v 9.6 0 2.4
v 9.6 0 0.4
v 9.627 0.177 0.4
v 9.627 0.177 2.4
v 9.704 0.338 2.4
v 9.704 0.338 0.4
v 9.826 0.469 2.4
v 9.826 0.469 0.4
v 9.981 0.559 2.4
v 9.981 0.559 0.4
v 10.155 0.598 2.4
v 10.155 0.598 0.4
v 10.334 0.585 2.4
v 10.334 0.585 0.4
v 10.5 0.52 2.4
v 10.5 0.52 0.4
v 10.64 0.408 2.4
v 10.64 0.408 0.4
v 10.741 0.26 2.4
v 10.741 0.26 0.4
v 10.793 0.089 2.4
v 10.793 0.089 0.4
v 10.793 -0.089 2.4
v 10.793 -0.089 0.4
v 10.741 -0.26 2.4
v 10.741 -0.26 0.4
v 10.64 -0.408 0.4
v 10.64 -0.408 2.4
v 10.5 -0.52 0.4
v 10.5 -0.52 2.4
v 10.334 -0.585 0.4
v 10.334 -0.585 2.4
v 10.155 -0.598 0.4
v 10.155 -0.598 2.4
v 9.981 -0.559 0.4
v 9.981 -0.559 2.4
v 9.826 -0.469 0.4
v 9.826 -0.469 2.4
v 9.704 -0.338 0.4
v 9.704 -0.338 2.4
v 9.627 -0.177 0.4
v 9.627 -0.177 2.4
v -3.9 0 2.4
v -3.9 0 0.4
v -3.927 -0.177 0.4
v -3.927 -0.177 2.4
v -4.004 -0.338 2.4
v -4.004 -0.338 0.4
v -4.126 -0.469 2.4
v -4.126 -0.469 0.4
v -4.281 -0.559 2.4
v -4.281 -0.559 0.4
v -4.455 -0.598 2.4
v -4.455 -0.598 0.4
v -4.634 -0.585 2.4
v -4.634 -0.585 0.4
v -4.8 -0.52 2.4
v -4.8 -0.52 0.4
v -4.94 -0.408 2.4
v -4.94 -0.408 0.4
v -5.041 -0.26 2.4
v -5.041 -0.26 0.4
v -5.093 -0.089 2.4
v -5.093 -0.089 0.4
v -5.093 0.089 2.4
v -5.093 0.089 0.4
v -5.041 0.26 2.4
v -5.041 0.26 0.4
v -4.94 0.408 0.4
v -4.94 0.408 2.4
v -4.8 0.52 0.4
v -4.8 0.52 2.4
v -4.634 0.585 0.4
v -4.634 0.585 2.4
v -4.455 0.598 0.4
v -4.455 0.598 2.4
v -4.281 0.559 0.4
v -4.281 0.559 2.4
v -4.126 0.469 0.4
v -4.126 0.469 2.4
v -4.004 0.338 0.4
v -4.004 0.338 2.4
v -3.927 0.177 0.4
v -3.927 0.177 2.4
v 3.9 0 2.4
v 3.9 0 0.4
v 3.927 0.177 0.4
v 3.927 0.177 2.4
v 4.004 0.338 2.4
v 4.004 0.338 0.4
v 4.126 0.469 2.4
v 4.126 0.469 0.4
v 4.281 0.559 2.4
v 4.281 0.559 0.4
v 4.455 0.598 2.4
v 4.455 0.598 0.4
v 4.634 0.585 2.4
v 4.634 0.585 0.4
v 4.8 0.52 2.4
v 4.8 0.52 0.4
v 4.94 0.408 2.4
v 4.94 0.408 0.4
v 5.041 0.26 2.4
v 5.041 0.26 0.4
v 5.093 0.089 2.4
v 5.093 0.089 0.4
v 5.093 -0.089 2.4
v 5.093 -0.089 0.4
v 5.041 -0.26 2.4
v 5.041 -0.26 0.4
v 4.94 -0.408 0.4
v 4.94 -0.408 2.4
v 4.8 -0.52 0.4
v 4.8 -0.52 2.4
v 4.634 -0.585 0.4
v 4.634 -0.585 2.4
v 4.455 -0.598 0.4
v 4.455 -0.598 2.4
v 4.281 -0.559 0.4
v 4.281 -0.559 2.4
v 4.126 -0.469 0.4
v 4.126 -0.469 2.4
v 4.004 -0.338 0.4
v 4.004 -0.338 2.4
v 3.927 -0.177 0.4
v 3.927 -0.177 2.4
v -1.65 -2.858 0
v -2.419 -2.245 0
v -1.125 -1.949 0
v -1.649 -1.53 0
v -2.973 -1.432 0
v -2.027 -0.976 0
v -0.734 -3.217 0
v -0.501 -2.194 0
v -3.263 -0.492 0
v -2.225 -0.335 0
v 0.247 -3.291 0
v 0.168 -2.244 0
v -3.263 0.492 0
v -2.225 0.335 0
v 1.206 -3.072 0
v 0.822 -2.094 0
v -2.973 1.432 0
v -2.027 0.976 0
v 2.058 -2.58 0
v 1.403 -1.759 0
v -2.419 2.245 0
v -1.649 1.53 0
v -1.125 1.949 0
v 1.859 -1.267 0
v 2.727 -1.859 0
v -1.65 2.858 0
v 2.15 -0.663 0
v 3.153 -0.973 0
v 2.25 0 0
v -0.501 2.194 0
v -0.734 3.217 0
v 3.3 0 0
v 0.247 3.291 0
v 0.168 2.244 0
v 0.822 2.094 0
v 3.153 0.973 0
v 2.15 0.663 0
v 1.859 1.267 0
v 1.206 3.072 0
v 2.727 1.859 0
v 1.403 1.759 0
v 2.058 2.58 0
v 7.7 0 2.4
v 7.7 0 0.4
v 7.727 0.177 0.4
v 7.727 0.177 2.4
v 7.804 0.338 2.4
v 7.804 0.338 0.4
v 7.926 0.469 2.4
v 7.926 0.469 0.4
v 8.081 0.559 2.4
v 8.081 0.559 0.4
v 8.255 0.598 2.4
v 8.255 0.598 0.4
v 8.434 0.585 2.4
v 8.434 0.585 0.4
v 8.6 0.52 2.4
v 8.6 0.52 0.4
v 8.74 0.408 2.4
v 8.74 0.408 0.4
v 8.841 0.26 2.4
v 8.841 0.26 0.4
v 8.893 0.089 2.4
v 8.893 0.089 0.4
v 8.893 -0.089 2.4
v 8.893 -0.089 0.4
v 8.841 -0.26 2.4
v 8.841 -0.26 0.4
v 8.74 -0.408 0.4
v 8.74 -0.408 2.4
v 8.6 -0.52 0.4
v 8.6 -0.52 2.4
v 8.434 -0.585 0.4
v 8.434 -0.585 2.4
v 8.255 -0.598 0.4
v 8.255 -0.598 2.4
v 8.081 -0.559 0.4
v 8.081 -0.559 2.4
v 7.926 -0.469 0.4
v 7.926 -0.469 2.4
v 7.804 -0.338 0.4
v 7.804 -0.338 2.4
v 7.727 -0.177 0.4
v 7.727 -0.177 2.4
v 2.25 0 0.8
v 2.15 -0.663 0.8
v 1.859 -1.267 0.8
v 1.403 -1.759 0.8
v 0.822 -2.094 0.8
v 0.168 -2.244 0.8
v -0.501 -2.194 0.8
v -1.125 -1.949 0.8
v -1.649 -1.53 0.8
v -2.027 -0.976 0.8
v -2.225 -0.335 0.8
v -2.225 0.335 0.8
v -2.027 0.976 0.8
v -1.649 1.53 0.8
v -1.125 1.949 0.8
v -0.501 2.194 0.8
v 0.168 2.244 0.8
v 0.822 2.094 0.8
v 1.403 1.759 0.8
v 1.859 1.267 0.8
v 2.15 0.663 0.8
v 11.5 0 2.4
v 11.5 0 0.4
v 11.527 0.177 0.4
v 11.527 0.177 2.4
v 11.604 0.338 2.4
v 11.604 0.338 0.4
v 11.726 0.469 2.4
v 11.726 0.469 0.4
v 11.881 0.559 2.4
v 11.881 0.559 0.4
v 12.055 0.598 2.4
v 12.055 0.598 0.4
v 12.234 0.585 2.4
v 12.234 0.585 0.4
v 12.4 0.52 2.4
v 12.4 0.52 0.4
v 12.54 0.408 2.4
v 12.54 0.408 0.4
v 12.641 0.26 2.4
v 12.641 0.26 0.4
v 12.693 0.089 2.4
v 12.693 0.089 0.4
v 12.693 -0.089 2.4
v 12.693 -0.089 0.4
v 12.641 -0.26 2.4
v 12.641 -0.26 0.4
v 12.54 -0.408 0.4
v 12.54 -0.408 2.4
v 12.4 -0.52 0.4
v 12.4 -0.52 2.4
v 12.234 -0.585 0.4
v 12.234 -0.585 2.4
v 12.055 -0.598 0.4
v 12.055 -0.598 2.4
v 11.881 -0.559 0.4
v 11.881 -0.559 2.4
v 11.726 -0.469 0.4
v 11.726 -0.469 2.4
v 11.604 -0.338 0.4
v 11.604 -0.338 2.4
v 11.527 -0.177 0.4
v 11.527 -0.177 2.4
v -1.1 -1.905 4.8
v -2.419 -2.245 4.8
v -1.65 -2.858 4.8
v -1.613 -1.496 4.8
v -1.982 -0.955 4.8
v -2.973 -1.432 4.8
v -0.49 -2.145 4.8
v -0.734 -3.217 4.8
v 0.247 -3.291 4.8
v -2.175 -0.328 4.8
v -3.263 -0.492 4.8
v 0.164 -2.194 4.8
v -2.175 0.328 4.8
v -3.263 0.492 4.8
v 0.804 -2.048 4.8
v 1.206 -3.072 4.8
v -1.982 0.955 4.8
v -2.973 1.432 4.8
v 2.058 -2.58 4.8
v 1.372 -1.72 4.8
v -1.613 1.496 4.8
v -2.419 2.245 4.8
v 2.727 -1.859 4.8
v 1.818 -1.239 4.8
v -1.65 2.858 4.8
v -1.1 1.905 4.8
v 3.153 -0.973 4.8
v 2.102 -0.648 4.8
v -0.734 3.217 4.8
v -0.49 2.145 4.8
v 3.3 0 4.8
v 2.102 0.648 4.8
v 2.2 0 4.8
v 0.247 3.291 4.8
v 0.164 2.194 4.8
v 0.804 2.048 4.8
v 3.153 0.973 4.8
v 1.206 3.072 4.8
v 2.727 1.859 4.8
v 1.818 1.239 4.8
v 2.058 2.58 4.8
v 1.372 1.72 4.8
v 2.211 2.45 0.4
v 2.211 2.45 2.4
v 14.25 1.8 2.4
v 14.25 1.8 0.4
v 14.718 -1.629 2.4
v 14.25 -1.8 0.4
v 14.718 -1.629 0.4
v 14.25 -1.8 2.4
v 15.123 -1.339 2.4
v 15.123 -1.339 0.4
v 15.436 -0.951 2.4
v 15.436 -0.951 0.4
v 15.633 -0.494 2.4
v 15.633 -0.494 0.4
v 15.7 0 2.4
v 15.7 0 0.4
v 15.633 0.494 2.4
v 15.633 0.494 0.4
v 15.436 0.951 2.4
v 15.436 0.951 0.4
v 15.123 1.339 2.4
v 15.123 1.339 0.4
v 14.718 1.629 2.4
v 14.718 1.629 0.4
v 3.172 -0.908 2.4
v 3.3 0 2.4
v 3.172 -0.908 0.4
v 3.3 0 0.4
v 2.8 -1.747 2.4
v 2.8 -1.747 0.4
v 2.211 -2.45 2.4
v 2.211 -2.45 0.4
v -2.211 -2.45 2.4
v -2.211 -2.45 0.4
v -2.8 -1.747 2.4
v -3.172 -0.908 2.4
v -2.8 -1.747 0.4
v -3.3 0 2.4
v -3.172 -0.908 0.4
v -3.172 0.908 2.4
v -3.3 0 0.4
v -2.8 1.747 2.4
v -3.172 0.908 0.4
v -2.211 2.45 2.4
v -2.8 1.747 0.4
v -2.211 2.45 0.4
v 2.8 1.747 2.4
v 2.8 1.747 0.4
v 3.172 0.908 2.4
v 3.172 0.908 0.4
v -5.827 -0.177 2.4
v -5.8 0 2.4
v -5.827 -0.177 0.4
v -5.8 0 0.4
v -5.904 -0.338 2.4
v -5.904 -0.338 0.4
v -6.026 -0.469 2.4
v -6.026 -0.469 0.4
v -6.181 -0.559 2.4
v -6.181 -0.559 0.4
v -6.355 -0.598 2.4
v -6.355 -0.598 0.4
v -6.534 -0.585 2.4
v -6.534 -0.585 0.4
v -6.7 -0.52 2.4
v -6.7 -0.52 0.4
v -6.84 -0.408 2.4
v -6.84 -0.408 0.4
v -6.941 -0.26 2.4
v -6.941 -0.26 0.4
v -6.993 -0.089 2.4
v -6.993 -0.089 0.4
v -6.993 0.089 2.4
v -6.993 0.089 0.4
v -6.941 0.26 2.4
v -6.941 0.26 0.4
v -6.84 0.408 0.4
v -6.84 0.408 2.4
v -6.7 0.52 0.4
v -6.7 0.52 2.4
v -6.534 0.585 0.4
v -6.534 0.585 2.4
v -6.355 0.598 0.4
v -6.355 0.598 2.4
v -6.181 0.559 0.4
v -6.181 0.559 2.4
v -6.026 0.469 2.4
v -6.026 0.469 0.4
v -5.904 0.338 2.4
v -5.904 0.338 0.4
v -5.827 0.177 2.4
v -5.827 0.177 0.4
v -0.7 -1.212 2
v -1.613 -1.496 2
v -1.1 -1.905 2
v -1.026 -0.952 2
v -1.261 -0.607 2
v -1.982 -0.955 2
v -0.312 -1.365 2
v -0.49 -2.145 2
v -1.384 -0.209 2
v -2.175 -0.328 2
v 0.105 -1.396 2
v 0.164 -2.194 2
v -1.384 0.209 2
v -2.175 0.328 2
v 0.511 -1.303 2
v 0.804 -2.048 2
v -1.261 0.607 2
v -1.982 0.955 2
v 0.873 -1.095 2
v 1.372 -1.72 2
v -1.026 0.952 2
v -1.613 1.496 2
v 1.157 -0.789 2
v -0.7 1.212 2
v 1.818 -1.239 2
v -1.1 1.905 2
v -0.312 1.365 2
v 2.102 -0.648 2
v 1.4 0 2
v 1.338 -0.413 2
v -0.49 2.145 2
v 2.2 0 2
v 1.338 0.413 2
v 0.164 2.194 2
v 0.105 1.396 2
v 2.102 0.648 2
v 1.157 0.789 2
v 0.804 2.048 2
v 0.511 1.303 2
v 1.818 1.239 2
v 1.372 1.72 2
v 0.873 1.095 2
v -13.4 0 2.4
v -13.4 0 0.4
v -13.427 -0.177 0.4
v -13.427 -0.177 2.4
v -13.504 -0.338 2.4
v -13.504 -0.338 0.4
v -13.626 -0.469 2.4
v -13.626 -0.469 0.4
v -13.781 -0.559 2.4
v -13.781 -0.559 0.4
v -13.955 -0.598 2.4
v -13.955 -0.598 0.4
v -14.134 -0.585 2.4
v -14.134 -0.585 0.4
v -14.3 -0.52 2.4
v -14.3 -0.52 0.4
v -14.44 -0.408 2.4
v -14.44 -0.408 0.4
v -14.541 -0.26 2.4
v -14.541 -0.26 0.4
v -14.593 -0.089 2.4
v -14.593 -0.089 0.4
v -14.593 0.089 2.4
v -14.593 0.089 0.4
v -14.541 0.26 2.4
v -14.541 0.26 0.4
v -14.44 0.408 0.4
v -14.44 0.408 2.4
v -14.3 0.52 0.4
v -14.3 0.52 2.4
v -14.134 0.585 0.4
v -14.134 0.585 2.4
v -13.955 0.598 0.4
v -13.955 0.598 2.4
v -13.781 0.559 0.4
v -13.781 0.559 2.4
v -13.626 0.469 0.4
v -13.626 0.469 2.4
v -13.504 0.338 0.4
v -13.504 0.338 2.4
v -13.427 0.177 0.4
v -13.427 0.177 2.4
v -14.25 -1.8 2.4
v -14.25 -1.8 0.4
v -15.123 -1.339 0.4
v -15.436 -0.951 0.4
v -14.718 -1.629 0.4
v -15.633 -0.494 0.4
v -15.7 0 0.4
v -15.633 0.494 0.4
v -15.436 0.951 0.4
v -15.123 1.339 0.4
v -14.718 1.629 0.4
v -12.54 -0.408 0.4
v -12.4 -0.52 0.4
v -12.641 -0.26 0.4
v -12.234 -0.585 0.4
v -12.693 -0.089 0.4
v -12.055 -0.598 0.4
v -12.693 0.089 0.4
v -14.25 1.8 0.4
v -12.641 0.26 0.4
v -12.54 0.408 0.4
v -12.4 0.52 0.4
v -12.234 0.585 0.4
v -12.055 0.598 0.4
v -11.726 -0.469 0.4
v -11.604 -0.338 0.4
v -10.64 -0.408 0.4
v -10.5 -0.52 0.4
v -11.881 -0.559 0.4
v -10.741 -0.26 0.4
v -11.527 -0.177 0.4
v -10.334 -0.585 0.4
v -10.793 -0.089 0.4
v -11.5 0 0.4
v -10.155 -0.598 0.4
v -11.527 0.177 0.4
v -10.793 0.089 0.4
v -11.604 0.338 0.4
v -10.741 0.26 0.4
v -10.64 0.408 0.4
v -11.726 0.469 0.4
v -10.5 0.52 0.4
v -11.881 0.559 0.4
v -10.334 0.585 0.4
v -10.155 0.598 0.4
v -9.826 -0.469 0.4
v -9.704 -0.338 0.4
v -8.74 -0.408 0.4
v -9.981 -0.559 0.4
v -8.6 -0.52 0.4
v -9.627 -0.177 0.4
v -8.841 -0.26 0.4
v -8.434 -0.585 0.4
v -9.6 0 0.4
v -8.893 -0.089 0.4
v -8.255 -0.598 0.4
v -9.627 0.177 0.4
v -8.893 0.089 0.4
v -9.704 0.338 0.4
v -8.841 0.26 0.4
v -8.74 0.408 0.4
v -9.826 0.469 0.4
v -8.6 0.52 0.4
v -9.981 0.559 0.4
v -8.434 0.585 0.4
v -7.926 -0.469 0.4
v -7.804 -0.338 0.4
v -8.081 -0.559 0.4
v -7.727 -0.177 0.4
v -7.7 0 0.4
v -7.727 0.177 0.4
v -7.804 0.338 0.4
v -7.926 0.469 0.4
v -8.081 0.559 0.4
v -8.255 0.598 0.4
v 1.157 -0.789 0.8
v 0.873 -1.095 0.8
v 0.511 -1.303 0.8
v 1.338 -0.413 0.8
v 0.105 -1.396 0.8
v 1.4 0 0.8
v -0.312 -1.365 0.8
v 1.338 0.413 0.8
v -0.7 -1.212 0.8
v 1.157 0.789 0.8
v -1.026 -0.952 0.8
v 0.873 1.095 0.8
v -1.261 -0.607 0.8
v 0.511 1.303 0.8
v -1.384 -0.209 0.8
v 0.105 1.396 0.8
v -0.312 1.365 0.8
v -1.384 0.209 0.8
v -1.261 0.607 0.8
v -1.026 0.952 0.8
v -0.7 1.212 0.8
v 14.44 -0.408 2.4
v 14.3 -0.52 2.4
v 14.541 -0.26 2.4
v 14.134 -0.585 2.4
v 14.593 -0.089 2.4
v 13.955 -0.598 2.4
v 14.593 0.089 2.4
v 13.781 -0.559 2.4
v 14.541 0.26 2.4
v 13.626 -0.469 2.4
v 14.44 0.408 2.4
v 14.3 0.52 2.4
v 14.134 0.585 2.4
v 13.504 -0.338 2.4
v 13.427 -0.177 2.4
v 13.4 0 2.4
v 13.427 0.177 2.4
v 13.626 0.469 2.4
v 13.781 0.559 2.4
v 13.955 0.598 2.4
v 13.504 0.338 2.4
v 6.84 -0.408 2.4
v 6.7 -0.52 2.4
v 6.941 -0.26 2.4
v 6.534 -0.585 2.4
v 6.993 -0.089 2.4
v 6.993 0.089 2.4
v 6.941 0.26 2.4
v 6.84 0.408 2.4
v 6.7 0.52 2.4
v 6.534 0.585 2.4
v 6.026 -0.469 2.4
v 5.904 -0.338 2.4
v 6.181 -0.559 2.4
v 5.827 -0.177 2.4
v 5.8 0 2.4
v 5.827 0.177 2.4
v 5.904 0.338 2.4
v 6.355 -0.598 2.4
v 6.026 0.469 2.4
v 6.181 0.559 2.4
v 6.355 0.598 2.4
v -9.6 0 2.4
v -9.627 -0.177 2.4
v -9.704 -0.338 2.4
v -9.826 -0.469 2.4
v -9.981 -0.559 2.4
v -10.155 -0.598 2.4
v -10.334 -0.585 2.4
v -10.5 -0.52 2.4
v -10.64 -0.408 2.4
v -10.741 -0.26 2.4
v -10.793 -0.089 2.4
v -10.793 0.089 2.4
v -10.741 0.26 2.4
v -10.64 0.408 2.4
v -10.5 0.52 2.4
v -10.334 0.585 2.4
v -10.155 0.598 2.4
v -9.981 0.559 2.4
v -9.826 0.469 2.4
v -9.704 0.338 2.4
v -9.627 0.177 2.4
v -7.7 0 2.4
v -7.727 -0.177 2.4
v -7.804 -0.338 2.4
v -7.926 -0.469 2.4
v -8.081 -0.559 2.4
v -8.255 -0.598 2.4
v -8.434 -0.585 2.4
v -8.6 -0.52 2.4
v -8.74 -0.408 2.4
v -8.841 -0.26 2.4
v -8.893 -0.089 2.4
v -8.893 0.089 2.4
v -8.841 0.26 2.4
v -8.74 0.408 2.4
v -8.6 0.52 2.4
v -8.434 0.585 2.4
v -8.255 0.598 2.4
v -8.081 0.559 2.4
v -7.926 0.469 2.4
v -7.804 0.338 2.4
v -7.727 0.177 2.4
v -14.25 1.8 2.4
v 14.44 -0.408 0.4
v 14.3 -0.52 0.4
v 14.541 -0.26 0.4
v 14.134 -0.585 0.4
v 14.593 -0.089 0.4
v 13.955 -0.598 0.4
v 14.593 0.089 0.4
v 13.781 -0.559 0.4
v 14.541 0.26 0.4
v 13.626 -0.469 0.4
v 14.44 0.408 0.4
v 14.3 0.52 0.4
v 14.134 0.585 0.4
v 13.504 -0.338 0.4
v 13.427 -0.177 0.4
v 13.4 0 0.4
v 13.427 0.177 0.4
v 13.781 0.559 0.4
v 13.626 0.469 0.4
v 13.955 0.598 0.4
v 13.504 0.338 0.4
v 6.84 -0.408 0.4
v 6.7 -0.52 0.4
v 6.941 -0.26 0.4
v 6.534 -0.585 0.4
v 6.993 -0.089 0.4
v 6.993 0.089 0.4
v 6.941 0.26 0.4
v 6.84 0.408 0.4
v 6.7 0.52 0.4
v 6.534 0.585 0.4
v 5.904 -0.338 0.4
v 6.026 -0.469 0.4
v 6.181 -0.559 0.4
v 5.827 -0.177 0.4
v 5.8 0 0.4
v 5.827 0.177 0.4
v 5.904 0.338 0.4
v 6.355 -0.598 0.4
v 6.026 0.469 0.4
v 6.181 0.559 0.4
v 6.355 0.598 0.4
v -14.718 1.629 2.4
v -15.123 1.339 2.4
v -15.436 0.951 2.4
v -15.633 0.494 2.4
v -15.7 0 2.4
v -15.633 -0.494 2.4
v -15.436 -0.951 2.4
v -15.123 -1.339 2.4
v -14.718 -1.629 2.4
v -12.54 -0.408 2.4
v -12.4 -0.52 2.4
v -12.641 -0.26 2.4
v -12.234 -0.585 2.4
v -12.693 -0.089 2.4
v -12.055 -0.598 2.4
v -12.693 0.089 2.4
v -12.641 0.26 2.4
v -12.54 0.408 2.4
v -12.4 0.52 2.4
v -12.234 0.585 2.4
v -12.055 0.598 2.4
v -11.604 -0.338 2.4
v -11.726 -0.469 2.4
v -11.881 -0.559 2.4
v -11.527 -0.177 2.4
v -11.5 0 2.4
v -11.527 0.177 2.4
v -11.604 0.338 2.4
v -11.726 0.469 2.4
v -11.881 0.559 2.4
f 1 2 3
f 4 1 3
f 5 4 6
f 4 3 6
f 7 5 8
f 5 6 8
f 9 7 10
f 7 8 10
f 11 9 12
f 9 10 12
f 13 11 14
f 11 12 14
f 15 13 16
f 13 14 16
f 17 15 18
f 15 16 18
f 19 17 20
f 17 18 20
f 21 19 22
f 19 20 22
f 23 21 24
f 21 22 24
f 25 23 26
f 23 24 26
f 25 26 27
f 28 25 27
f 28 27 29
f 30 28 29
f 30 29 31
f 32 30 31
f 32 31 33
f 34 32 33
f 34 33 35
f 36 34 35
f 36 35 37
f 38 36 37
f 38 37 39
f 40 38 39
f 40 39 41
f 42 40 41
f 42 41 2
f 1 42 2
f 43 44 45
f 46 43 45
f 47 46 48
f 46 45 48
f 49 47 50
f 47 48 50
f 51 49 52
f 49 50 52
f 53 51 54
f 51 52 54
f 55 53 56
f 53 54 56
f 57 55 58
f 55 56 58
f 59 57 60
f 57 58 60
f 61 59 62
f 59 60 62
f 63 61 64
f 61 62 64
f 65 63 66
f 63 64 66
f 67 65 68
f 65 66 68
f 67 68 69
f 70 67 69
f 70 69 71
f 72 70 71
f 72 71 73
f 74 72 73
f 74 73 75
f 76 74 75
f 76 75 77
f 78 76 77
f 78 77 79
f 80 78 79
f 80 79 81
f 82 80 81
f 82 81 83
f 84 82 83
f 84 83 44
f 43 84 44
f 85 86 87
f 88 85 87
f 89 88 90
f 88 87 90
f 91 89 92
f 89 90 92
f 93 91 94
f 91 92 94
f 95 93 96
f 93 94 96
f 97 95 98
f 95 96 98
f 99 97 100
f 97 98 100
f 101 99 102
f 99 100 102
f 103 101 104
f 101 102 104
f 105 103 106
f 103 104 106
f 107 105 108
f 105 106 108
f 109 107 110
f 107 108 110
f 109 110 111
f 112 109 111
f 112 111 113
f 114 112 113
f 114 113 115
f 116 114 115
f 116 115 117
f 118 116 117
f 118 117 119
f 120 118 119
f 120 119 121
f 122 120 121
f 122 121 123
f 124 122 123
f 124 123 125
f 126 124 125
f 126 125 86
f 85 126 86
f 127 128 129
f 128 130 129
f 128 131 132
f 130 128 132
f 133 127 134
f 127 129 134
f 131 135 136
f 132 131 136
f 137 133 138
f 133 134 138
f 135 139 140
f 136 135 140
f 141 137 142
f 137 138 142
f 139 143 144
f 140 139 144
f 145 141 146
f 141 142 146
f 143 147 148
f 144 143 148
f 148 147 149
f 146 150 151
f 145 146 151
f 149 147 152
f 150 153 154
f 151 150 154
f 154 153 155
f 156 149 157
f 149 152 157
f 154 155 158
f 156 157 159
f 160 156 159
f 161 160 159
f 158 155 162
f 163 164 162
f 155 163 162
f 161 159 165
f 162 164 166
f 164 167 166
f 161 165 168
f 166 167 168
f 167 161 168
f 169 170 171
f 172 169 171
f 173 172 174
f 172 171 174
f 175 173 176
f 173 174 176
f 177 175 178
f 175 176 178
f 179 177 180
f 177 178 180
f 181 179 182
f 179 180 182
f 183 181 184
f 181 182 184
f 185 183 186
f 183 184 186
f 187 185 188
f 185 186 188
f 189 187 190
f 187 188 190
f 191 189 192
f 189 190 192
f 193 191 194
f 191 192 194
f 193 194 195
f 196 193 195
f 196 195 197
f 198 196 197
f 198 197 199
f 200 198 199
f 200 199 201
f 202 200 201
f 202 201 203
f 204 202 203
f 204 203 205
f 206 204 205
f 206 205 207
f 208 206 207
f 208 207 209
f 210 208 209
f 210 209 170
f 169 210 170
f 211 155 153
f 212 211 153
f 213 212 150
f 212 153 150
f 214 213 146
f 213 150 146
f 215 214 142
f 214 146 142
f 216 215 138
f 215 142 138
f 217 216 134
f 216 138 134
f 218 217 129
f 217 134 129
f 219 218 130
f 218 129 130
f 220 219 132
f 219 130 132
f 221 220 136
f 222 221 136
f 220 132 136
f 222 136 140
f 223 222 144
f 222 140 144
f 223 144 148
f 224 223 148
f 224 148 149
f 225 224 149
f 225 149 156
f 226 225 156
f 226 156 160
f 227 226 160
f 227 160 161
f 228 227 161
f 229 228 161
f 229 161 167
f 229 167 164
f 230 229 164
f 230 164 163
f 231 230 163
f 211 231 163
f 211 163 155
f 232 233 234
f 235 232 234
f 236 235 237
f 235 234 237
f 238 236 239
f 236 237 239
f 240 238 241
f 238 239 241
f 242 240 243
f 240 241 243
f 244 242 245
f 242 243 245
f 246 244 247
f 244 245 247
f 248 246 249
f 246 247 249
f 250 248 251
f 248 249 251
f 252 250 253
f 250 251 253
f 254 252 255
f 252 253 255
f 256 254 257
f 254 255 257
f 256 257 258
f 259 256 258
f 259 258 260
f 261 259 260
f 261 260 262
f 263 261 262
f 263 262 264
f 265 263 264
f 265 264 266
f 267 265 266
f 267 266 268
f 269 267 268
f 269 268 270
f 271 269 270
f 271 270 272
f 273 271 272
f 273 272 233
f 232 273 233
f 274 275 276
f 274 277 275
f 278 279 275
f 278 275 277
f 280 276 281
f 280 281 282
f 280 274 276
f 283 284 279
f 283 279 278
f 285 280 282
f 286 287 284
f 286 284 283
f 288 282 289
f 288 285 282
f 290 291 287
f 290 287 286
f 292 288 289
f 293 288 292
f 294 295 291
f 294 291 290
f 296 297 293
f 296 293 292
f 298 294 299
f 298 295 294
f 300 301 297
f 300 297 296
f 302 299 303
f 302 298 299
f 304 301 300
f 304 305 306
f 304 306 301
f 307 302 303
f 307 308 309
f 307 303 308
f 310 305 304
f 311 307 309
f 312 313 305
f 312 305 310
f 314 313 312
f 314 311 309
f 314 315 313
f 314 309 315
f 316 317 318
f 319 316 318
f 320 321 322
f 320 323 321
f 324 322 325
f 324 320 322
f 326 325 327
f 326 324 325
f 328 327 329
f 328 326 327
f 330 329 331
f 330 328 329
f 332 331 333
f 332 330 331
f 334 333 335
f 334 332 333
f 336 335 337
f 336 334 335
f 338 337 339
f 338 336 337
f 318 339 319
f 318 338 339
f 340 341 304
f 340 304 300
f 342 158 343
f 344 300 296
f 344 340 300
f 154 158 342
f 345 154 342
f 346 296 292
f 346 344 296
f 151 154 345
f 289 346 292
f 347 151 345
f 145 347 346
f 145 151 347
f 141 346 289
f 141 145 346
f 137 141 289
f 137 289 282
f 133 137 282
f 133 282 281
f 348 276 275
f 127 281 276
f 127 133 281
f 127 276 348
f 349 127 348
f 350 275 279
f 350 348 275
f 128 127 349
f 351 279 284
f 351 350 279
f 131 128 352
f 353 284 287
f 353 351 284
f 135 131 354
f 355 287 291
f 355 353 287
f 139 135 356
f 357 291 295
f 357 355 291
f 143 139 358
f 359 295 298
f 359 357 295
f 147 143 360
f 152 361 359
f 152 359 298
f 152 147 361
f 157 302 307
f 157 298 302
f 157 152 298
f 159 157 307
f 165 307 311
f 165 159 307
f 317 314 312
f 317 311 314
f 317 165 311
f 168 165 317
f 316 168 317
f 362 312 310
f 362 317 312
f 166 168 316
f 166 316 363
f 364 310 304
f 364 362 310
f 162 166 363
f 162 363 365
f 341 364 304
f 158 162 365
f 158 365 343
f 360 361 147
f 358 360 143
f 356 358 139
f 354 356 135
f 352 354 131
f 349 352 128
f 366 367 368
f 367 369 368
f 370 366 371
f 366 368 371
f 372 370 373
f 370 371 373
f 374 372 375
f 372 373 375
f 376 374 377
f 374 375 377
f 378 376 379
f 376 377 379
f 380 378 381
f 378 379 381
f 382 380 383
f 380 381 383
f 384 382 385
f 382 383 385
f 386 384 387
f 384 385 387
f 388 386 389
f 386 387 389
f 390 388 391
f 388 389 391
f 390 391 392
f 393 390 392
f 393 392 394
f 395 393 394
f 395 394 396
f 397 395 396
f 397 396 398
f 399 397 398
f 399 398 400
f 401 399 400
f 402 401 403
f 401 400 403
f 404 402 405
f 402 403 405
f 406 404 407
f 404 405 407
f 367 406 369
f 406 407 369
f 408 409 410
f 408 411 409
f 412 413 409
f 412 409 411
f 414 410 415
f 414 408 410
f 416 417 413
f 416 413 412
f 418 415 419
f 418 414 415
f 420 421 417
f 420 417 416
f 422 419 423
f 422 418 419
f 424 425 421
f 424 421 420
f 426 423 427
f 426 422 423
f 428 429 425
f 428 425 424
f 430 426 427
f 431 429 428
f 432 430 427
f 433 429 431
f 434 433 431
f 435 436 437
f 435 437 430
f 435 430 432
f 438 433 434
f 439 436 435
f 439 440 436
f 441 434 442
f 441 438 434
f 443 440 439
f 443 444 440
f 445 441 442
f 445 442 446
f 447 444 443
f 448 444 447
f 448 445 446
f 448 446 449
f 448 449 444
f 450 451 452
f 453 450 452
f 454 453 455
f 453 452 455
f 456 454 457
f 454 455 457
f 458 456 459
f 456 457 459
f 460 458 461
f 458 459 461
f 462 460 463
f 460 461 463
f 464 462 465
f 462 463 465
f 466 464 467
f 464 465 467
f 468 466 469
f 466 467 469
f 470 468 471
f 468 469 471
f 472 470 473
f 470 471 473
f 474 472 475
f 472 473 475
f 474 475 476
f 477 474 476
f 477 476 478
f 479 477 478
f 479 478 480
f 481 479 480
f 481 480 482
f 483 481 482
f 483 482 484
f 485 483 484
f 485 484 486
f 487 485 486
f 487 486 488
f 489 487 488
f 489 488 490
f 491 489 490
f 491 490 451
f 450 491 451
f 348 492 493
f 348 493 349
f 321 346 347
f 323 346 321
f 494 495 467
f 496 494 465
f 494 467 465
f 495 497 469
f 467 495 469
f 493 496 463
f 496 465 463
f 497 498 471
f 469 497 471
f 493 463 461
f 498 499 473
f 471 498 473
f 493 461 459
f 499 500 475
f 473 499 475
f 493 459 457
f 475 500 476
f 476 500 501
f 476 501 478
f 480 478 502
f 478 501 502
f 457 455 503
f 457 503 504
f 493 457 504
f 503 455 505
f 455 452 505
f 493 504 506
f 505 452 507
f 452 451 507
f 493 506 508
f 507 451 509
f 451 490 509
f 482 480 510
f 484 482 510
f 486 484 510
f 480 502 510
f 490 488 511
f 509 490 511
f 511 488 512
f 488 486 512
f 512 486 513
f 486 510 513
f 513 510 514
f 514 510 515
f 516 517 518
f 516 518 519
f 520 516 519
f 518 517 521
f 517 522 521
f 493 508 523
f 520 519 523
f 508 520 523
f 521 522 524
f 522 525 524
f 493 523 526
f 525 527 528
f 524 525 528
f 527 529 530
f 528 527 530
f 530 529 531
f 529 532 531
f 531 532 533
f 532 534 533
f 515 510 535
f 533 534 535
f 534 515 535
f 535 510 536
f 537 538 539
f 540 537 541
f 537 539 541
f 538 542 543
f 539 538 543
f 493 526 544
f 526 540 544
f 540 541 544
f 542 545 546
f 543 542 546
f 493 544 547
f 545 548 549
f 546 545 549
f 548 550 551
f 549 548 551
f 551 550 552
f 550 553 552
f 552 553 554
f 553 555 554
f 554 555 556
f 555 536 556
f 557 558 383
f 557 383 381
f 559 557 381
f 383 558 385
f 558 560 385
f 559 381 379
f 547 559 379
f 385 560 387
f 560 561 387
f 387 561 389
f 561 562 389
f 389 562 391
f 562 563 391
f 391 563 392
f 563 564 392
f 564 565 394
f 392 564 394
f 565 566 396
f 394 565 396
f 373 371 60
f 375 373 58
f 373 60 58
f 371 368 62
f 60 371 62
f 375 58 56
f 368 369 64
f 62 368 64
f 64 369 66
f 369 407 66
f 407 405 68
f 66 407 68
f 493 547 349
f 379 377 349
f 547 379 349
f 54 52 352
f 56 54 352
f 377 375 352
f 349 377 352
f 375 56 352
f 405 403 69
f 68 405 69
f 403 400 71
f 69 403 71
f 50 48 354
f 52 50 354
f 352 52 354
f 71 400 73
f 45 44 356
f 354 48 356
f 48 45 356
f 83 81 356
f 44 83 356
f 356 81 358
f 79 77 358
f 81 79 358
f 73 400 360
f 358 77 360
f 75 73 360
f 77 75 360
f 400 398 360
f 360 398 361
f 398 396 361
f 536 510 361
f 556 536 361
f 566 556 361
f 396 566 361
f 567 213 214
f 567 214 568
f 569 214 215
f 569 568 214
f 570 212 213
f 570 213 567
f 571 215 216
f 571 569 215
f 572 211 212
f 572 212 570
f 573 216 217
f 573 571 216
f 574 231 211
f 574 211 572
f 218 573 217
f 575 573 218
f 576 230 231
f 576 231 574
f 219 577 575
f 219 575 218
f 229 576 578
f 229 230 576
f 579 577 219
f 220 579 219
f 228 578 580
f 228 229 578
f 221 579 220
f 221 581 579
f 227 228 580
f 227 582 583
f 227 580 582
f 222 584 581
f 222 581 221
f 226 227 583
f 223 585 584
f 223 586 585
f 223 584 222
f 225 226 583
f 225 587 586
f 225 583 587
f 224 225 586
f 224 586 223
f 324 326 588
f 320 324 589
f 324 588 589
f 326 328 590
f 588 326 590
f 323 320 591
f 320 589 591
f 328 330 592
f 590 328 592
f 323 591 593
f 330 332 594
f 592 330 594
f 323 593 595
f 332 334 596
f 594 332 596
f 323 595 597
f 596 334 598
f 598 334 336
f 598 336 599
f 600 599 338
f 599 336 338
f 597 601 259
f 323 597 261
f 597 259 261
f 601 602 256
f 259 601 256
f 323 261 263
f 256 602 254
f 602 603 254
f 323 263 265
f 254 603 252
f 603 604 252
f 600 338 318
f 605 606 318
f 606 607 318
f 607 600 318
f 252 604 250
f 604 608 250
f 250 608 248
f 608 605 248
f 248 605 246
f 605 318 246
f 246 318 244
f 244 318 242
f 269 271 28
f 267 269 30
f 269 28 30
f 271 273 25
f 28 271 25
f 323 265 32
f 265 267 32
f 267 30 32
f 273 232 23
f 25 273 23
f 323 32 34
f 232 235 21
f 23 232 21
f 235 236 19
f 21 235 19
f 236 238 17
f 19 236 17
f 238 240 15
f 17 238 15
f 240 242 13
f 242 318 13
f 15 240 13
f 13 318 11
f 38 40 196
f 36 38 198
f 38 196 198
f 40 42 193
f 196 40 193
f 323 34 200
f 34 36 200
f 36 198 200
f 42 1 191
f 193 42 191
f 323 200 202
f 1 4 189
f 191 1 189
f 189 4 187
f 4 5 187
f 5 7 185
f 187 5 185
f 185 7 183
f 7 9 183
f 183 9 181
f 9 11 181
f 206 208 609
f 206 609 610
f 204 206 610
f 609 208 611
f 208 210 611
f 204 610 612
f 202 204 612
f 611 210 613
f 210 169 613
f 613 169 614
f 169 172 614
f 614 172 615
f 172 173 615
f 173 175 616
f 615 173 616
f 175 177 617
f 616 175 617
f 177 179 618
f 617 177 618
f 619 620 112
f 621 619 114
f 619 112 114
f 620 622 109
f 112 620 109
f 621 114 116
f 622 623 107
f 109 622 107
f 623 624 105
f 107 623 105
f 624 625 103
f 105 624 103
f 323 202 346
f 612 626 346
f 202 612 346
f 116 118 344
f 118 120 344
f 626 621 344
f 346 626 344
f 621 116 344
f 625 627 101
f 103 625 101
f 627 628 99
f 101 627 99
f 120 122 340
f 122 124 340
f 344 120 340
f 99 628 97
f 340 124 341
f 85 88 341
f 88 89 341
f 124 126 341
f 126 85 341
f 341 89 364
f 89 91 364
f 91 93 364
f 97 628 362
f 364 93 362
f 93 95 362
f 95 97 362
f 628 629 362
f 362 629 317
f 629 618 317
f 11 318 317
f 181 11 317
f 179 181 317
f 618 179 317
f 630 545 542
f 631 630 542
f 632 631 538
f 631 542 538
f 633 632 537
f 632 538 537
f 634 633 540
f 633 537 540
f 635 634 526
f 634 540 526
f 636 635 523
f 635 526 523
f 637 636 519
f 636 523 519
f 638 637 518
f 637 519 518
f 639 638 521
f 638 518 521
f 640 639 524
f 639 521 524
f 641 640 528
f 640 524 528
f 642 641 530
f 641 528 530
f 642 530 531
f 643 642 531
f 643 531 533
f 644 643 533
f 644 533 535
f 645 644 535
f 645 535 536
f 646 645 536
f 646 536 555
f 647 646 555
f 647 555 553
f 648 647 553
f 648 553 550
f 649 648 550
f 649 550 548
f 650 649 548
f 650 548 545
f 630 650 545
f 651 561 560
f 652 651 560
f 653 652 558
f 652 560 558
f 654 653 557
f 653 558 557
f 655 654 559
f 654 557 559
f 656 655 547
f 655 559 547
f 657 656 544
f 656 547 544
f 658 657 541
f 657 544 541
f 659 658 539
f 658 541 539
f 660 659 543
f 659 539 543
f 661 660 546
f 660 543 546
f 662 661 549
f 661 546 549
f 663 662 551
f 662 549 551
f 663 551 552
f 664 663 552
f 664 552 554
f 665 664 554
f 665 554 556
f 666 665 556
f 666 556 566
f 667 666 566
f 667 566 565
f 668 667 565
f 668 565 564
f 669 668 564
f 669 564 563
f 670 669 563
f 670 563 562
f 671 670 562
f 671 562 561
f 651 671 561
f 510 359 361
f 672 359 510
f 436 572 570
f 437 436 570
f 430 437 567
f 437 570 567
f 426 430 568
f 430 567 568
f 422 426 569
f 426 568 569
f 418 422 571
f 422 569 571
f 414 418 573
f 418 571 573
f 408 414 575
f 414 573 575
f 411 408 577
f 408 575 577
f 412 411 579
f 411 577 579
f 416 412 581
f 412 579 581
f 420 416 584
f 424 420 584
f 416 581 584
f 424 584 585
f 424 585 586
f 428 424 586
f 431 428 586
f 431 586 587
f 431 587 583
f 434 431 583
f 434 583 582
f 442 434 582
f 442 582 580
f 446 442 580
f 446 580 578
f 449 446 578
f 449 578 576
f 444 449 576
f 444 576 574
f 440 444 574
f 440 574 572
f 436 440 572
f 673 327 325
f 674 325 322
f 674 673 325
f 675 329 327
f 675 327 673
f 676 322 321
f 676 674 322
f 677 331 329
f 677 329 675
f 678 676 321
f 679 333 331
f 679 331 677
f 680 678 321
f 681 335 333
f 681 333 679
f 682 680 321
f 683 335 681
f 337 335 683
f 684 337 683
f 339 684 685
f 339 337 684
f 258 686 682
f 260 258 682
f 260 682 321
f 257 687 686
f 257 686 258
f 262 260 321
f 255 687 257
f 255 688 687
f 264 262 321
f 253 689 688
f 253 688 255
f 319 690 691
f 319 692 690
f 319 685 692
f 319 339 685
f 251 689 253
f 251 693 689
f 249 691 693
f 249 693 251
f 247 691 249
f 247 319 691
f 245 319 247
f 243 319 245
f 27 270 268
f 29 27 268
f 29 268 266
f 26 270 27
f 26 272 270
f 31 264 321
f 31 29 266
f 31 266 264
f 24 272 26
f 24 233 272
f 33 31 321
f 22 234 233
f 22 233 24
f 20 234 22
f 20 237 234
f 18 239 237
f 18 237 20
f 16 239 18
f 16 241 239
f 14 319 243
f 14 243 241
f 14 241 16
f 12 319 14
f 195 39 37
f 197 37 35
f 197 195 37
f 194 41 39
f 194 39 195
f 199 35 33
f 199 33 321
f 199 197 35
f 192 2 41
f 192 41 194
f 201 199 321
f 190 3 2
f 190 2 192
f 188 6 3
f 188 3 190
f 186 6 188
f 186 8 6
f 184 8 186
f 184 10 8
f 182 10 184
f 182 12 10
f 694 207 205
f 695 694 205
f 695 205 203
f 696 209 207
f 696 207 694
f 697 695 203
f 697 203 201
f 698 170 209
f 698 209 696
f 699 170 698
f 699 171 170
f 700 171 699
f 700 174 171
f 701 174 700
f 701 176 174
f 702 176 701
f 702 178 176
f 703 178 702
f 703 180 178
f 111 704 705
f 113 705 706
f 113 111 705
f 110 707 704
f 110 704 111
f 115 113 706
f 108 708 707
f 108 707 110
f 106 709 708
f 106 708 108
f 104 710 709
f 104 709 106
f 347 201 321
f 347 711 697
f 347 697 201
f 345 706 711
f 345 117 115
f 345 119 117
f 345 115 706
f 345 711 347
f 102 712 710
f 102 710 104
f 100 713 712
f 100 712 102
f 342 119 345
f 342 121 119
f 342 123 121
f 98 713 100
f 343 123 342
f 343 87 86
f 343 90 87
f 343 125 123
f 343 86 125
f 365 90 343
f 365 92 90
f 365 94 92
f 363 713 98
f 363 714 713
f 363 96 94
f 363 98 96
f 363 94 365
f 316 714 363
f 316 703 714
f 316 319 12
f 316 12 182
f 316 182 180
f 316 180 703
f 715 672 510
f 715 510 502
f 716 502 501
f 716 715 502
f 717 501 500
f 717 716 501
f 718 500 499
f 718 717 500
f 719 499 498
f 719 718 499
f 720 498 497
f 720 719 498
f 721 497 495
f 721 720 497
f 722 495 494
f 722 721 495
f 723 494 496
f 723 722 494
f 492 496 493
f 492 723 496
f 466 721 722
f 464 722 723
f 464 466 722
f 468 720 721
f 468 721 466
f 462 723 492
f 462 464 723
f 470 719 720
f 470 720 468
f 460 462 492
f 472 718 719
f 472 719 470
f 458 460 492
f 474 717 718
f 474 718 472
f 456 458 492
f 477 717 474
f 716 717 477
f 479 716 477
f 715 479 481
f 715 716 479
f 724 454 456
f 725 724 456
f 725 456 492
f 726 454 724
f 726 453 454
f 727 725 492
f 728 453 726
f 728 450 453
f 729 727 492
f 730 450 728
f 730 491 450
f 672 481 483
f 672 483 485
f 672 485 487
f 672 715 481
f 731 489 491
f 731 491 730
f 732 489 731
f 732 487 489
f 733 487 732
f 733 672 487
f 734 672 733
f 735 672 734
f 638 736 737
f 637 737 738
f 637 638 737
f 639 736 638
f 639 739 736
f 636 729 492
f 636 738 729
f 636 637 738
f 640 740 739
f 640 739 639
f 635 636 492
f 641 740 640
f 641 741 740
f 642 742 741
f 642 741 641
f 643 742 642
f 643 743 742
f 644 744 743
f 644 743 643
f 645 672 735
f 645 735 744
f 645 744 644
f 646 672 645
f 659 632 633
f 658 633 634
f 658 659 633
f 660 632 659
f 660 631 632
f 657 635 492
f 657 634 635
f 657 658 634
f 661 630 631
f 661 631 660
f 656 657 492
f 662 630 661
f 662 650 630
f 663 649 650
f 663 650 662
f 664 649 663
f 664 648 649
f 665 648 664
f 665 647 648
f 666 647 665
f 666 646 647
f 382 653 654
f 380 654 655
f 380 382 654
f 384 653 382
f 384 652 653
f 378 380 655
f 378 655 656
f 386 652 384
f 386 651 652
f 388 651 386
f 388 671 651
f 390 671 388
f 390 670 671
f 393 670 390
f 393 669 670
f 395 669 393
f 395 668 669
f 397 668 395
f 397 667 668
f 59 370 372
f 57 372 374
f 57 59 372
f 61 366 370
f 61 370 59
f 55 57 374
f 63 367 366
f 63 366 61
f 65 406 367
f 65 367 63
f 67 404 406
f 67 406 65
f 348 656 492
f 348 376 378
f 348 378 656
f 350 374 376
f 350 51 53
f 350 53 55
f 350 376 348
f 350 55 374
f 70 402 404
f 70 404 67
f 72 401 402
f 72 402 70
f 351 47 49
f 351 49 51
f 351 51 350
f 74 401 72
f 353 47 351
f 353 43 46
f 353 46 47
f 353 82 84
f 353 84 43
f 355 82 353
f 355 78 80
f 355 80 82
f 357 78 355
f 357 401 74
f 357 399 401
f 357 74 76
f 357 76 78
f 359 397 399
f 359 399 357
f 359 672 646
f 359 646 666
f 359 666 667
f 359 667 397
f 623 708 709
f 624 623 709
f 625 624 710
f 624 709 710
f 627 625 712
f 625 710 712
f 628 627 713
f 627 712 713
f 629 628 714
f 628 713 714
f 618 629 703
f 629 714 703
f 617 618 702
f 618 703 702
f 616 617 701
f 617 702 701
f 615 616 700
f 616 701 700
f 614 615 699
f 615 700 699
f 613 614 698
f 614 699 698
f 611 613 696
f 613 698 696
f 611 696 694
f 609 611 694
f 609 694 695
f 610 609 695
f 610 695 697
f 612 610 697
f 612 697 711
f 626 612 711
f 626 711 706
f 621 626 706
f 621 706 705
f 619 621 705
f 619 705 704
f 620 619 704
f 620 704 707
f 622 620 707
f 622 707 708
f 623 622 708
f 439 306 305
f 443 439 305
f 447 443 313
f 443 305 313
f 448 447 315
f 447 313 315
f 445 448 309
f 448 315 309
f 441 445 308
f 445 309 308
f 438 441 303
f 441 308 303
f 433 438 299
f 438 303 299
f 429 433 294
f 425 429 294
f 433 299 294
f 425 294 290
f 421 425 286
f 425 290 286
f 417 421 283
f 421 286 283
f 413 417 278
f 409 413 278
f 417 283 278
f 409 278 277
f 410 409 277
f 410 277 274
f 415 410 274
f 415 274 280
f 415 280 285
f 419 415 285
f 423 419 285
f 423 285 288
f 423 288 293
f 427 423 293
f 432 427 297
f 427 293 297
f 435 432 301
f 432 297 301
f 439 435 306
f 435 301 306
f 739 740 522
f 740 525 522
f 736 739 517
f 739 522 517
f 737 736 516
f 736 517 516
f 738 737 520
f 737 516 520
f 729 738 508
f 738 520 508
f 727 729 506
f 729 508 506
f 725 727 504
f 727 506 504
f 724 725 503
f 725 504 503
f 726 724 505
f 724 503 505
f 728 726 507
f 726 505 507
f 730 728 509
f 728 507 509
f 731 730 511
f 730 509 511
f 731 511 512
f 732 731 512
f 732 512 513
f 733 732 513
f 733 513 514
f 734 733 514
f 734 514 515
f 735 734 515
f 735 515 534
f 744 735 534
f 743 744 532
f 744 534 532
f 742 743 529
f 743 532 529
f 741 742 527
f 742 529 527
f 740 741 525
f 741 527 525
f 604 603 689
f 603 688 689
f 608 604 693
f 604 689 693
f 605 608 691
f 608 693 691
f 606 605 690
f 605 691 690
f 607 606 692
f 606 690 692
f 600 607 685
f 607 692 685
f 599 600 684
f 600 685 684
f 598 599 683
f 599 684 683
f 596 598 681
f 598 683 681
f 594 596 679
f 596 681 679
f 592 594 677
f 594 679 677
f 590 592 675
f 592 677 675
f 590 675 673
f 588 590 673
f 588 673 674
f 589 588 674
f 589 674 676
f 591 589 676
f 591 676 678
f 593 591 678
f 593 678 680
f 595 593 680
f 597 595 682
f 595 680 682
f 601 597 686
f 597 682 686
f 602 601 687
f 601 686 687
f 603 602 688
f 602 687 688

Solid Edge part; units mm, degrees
sketch "Sketch1" plane through (0, 0, 0) normal (0, 0, 1) x (1, 0, 0)
  circle A0 centre (0, 0) radius 3.3
  dimension "D1" = 6.6
extrude "Protrusion1" add sketch "Sketch1" along normal blind 4.8
sketch "Sketch2" plane through (0, 0, 0) normal (0, 0, -1) x (1, 0, 0)
  circle A0 centre (0, 0) radius 2.25
  dimension "D1" = 4.5
extrude "Extrusionsausschnitt_1" cut sketch "Sketch2" against normal blind 0.8
sketch "Sketch3" plane through (0, 0, 0.8) normal (0, 0, -1) x (1, 0, 0)
  circle A0 centre (0, 0) radius 1.4
  dimension "D1" = 2.8
extrude "Cutout1" cut sketch "Sketch3" against normal through all
sketch "Sketch4" plane through (0, 0, 4.8) normal (0, 0, 1) x (1, 0, 0)
  circle A0 centre (0, 0) radius 2.2
  dimension "D1" = 4.4
extrude "Extrusionsausschnitt_3" cut sketch "Sketch4" against normal blind 2.8
sketch "Sketch5" plane through (0, 0, 2.4) normal (0, 0, 1) x (1, 0, 0)
  line L0 (-2.2108, 2.45) -> (-14.25, 1.8)
  arc A0 (-14.25, 1.8) -> (-14.25, -1.8) centre (-13.8578, 0) ccw
  line L1 (-14.25, -1.8) -> (-2.2108, -2.45)
  arc A1 (-2.2108, 2.45) -> (-2.2108, -2.45) centre (0, 0) ccw
  line L2 (2.2108, 2.45) -> (14.25, 1.8)
  arc A2 (14.25, 1.8) -> (14.25, -1.8) centre (13.8578, 0) cw
  line L3 (2.2108, -2.45) -> (14.25, -1.8)
  arc A3 (2.2108, 2.45) -> (2.2108, -2.45) centre (0, 0) cw
  dimension "D1" = 31.4
  dimension "D2" = 3.6
  dimension "D3" = 28.5
  dimension "D4" = 4.9
extrude "Extrusionsausprägung_2" add sketch "Sketch5" against normal blind 2
sketch "Sketch6" plane through (0, 0, 0) normal (0, 0, 1) x (1, 0, 0)
  circle A0 centre (-14, 0) radius 0.6
  circle A1 centre (-12.1, 0) radius 0.6
  circle A2 centre (-10.2, 0) radius 0.6
  circle A3 centre (-8.3, 0) radius 0.6
  circle A4 centre (-6.4, 0) radius 0.6
  circle A5 centre (-4.5, 0) radius 0.6
  dimension "D1" = 9.5
  dimension "D2" = 1.2
  dimension "D3" = 16.2
extrude "Cutout2" cut sketch "Sketch6" along normal through all
mirror "Mirror1" about plane through (0, 0, 0) normal (1, 0, 0) of "Cutout2"
